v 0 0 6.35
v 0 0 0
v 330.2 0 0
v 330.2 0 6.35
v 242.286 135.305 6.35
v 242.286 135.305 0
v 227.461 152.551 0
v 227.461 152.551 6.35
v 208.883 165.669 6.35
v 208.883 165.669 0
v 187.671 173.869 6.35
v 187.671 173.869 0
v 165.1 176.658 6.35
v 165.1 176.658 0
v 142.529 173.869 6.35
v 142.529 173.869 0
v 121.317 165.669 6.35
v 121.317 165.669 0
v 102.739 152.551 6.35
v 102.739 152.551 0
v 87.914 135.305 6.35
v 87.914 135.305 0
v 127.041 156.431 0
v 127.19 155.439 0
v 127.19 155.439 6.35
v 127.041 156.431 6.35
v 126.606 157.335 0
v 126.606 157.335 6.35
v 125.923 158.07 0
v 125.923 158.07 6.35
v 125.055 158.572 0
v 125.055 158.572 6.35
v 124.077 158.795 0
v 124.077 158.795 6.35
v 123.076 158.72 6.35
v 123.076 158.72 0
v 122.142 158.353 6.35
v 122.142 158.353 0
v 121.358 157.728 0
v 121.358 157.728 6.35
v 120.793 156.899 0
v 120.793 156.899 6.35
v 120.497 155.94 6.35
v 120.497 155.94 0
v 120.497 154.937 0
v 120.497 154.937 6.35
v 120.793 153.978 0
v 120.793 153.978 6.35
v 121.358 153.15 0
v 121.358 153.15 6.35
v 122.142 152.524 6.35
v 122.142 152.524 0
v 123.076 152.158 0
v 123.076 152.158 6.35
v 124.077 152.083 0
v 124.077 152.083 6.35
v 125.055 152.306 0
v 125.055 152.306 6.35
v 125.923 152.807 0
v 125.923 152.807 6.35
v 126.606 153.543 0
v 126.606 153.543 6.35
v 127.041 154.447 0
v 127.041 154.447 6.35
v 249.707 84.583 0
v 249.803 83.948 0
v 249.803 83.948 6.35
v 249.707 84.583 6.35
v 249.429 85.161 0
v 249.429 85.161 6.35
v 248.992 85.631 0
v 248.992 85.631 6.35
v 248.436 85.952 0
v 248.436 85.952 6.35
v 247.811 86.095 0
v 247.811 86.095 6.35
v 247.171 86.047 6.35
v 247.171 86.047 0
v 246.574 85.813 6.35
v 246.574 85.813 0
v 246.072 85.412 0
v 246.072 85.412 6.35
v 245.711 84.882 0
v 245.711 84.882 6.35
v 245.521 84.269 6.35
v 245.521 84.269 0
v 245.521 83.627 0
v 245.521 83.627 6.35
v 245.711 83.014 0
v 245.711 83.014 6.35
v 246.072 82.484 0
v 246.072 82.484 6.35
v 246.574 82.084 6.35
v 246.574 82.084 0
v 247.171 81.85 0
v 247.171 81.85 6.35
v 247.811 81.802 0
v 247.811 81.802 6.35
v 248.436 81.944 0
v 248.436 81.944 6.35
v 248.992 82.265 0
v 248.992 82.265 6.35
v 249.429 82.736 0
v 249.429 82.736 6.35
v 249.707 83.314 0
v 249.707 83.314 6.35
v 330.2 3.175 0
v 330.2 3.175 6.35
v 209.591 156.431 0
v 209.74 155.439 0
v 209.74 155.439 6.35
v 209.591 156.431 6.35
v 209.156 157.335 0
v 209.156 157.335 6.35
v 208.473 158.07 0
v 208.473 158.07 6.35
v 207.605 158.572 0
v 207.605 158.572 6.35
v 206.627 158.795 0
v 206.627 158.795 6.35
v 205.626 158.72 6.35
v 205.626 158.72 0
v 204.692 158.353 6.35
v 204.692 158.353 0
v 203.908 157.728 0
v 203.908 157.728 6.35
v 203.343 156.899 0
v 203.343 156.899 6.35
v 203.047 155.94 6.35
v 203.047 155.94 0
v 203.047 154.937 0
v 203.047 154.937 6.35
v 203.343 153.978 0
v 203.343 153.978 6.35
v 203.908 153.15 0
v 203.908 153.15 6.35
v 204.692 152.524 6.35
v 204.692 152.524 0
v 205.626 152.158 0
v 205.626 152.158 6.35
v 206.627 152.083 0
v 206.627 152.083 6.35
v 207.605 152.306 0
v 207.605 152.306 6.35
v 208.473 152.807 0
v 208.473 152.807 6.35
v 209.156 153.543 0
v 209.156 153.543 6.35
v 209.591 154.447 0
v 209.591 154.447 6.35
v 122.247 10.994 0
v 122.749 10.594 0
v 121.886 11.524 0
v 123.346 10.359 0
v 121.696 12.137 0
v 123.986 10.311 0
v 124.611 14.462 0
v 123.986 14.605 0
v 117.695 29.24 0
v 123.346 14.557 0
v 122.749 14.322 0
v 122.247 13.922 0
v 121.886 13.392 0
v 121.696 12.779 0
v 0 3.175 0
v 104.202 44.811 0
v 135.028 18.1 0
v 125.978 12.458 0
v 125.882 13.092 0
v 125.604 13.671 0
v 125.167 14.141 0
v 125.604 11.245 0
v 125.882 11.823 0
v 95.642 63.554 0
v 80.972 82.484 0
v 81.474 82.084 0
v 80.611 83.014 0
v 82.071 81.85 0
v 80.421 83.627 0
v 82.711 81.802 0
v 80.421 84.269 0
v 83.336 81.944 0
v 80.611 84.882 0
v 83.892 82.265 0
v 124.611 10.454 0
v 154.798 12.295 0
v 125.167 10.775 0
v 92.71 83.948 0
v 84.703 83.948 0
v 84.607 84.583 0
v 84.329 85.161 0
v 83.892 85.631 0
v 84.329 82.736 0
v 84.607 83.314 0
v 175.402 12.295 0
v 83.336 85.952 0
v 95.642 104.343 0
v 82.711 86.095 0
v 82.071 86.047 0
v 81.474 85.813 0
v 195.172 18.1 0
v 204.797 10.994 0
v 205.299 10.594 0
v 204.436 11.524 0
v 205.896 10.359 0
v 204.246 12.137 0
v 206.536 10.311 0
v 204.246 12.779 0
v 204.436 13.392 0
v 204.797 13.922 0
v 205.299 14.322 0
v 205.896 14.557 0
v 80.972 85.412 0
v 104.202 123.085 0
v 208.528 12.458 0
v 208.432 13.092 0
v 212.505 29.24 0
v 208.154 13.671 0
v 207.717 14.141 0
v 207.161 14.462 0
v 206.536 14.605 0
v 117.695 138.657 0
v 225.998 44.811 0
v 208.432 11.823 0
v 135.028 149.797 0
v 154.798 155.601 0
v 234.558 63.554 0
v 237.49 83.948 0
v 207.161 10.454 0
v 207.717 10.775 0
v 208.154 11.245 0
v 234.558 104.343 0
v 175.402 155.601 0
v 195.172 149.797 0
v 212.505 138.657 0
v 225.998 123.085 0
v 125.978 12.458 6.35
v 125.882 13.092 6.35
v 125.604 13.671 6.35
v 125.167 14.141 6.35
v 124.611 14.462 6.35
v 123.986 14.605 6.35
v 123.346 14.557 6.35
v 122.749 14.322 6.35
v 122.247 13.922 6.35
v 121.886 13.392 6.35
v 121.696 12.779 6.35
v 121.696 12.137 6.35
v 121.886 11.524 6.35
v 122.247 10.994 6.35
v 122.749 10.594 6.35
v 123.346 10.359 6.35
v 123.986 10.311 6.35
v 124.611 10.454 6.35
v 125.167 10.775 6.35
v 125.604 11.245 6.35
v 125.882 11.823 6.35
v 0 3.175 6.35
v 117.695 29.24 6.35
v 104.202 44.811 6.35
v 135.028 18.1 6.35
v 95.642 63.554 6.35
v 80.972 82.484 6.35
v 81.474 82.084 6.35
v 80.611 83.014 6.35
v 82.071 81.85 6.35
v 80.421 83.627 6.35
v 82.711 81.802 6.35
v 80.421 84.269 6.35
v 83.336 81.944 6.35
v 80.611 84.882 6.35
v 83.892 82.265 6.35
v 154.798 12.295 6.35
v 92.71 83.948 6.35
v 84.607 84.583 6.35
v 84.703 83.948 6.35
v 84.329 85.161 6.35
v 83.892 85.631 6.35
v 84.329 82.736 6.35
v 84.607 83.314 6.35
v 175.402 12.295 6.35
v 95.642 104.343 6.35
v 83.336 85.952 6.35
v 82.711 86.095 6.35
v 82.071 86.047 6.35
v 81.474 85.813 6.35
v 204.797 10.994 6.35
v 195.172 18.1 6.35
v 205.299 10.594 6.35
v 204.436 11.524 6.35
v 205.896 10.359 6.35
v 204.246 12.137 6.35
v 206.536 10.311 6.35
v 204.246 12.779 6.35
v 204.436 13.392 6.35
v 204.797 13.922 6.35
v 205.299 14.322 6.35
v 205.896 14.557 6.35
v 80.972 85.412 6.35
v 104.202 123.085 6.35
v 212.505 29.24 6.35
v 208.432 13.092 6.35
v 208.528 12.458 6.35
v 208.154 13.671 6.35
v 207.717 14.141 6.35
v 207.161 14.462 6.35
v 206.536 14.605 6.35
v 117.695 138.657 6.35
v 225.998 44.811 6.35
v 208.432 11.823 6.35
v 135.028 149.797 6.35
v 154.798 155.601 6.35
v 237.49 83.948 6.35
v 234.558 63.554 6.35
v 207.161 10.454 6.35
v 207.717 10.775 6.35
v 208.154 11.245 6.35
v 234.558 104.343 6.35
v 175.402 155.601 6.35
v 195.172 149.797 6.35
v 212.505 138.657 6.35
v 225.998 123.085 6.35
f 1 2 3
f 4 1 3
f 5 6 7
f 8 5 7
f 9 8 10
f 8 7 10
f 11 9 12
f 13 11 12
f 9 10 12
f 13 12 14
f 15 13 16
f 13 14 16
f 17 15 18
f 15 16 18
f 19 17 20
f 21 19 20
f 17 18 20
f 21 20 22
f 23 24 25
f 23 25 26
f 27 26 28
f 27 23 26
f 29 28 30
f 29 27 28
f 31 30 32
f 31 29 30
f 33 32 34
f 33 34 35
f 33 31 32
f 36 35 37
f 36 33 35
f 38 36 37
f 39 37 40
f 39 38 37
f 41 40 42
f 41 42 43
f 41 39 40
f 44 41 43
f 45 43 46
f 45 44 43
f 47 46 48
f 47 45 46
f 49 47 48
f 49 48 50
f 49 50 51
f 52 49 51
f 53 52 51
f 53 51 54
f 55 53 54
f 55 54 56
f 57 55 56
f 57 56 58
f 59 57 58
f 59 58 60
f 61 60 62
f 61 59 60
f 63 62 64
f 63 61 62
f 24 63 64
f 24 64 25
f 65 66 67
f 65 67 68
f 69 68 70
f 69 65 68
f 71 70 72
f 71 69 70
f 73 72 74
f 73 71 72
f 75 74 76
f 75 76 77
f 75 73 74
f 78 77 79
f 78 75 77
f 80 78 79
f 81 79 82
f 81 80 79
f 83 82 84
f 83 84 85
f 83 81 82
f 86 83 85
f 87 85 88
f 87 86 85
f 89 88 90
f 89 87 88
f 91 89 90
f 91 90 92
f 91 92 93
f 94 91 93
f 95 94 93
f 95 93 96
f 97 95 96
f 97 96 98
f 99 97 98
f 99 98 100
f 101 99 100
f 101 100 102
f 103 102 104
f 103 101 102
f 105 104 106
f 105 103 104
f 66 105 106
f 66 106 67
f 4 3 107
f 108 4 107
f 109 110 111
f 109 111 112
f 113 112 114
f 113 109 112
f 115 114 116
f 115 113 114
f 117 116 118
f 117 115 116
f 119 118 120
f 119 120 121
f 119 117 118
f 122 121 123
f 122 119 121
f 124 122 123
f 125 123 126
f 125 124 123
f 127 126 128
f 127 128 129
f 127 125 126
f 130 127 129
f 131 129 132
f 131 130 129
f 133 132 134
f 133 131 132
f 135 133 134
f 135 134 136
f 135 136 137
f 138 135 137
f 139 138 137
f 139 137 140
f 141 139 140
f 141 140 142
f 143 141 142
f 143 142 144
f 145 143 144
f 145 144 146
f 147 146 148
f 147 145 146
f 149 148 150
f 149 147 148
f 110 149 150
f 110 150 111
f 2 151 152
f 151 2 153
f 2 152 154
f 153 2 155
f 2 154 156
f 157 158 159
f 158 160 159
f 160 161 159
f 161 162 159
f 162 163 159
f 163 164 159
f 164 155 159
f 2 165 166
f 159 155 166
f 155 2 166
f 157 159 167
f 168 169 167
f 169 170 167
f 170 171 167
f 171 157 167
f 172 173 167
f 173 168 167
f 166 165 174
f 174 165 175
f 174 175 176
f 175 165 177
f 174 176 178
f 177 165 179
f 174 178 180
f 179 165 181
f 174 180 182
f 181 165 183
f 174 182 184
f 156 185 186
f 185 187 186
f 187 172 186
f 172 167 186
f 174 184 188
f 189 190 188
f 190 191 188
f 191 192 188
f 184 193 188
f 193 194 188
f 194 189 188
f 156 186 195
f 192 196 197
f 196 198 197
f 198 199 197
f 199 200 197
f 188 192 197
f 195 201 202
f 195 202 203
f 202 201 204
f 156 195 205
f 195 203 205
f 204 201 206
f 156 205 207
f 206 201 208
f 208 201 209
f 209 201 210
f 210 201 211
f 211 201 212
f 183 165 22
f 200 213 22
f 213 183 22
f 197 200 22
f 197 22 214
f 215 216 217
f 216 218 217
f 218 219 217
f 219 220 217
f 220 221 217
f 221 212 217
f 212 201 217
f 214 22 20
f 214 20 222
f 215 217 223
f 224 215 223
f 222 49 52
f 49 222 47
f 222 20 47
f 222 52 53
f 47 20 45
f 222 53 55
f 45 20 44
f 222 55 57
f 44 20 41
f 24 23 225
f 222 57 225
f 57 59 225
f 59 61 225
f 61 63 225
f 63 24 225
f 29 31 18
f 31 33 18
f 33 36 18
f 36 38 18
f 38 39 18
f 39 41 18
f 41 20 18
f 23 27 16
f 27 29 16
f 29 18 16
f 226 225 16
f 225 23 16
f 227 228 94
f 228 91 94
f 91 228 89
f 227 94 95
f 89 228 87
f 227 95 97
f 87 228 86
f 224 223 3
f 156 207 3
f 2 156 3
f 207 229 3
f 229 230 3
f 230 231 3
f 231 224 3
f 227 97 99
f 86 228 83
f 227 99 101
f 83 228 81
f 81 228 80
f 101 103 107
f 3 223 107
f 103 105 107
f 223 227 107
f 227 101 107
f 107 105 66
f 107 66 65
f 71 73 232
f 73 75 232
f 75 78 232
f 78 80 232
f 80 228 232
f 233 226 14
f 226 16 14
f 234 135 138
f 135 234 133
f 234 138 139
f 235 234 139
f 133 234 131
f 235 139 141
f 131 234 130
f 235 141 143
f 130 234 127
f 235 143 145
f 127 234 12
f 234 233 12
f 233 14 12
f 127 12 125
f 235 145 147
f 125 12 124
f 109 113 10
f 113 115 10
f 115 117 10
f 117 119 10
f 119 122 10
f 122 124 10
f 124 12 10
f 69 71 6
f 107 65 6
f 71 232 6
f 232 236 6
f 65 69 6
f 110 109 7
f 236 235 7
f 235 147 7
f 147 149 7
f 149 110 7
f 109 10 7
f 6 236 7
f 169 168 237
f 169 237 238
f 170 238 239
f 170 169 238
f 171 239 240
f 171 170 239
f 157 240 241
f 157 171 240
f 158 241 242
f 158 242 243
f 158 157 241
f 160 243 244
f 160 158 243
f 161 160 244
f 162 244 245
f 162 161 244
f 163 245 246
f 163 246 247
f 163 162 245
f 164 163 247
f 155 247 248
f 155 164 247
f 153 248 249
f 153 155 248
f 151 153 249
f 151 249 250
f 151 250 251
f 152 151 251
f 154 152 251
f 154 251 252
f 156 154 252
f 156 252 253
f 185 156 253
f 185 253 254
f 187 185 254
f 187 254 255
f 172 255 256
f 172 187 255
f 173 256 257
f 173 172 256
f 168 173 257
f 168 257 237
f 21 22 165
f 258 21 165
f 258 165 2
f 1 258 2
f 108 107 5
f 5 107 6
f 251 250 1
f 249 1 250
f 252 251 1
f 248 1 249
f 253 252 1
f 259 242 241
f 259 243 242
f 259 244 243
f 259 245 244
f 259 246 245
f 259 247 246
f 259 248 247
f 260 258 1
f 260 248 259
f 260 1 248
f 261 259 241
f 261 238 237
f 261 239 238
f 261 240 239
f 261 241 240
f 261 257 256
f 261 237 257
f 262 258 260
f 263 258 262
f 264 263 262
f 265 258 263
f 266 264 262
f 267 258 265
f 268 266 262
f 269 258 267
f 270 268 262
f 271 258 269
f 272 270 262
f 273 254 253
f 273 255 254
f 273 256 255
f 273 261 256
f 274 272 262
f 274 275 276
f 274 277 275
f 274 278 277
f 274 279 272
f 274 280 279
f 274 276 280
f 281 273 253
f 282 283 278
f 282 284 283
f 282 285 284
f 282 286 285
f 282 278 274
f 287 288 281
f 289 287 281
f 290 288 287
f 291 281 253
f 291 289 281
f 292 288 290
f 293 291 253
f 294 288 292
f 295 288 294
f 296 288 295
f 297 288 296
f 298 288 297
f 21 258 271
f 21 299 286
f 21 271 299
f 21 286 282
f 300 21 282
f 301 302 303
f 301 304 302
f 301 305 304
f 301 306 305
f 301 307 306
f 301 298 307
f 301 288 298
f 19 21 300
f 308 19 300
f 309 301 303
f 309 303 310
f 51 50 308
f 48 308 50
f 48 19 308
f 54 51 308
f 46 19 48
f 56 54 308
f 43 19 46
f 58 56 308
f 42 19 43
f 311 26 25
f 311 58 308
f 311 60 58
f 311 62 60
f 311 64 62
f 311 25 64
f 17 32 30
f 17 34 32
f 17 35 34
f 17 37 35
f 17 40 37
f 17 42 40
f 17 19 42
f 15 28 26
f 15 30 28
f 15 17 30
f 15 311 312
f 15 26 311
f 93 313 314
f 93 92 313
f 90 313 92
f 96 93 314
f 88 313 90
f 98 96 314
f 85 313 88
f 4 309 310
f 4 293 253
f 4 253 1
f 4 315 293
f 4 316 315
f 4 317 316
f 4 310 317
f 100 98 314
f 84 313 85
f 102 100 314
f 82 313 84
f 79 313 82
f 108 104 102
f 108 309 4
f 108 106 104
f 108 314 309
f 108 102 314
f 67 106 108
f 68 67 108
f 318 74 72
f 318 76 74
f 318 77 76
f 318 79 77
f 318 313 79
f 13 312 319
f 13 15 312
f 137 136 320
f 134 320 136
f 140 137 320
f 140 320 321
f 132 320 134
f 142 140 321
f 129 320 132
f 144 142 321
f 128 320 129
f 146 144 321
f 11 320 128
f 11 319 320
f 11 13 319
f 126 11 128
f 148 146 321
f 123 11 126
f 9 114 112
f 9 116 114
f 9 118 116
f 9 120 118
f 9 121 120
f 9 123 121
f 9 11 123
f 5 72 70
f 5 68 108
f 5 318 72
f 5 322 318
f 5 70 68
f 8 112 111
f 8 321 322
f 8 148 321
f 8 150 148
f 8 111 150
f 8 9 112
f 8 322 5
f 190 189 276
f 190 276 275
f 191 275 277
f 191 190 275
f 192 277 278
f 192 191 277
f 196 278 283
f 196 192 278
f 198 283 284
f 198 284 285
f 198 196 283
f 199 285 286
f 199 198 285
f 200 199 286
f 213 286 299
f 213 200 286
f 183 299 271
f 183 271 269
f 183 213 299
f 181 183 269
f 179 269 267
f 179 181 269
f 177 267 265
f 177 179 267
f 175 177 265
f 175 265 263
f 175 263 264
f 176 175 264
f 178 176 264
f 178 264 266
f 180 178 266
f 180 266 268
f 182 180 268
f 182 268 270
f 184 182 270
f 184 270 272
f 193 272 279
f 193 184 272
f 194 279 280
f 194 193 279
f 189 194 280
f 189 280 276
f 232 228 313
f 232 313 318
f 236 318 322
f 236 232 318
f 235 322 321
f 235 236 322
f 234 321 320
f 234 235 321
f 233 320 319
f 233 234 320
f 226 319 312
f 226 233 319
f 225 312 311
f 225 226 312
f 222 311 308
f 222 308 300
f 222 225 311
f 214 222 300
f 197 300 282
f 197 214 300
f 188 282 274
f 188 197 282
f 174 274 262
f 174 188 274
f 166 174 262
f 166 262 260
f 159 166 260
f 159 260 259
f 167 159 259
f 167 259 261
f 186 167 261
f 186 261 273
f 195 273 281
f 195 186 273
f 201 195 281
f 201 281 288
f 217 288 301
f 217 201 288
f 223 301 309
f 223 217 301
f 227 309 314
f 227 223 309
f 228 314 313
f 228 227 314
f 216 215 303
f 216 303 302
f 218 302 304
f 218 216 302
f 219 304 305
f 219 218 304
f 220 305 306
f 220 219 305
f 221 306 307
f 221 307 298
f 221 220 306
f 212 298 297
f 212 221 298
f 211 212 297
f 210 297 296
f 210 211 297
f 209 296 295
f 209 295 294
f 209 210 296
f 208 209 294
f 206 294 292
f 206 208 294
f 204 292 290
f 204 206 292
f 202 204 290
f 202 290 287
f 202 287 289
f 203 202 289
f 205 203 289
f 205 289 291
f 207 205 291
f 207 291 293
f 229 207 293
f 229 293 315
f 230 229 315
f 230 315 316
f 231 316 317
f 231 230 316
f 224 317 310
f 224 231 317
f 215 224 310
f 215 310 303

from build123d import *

# Parameters (mm, degrees)
F0_R     = 2.15265
F0_R_2   = 72.39
F0_R_3   = 3.3655
F1_DEPTH = 6.35


with BuildPart() as f1:
    # F0 (on Top) → F1 (new body)
    with BuildSketch(Plane.XY):
        with BuildLine():
            Line((0, 3.175), (0, 0))
            Line((0, 0), (330.2, 0))
            Line((330.2, 0), (330.2, 3.175))
            Line((330.2, 3.175), (242.28583, 135.304837))
            ThreePointArc((242.28583, 135.304837), (165.1, 176.658321), (87.91417, 135.304837))
            Line((87.91417, 135.304837), (0, 3.175))
        make_face()
        with Locations((123.825, 12.457924)):
            Circle(F0_R, mode=Mode.SUBTRACT)
        with Locations((82.55, 83.948321)):
            Circle(F0_R, mode=Mode.SUBTRACT)
        with Locations((206.375, 12.457924)):
            Circle(F0_R, mode=Mode.SUBTRACT)
        with Locations((165.1, 83.948321)):
            Circle(F0_R_2, mode=Mode.SUBTRACT)
        with Locations((247.65, 83.948321)):
            Circle(F0_R, mode=Mode.SUBTRACT)
        with Locations((123.825, 155.438718)):
            Circle(F0_R_3, mode=Mode.SUBTRACT)
        with Locations((206.375, 155.438718)):
            Circle(F0_R_3, mode=Mode.SUBTRACT)
    extrude(amount=F1_DEPTH)


solid = f1.part
